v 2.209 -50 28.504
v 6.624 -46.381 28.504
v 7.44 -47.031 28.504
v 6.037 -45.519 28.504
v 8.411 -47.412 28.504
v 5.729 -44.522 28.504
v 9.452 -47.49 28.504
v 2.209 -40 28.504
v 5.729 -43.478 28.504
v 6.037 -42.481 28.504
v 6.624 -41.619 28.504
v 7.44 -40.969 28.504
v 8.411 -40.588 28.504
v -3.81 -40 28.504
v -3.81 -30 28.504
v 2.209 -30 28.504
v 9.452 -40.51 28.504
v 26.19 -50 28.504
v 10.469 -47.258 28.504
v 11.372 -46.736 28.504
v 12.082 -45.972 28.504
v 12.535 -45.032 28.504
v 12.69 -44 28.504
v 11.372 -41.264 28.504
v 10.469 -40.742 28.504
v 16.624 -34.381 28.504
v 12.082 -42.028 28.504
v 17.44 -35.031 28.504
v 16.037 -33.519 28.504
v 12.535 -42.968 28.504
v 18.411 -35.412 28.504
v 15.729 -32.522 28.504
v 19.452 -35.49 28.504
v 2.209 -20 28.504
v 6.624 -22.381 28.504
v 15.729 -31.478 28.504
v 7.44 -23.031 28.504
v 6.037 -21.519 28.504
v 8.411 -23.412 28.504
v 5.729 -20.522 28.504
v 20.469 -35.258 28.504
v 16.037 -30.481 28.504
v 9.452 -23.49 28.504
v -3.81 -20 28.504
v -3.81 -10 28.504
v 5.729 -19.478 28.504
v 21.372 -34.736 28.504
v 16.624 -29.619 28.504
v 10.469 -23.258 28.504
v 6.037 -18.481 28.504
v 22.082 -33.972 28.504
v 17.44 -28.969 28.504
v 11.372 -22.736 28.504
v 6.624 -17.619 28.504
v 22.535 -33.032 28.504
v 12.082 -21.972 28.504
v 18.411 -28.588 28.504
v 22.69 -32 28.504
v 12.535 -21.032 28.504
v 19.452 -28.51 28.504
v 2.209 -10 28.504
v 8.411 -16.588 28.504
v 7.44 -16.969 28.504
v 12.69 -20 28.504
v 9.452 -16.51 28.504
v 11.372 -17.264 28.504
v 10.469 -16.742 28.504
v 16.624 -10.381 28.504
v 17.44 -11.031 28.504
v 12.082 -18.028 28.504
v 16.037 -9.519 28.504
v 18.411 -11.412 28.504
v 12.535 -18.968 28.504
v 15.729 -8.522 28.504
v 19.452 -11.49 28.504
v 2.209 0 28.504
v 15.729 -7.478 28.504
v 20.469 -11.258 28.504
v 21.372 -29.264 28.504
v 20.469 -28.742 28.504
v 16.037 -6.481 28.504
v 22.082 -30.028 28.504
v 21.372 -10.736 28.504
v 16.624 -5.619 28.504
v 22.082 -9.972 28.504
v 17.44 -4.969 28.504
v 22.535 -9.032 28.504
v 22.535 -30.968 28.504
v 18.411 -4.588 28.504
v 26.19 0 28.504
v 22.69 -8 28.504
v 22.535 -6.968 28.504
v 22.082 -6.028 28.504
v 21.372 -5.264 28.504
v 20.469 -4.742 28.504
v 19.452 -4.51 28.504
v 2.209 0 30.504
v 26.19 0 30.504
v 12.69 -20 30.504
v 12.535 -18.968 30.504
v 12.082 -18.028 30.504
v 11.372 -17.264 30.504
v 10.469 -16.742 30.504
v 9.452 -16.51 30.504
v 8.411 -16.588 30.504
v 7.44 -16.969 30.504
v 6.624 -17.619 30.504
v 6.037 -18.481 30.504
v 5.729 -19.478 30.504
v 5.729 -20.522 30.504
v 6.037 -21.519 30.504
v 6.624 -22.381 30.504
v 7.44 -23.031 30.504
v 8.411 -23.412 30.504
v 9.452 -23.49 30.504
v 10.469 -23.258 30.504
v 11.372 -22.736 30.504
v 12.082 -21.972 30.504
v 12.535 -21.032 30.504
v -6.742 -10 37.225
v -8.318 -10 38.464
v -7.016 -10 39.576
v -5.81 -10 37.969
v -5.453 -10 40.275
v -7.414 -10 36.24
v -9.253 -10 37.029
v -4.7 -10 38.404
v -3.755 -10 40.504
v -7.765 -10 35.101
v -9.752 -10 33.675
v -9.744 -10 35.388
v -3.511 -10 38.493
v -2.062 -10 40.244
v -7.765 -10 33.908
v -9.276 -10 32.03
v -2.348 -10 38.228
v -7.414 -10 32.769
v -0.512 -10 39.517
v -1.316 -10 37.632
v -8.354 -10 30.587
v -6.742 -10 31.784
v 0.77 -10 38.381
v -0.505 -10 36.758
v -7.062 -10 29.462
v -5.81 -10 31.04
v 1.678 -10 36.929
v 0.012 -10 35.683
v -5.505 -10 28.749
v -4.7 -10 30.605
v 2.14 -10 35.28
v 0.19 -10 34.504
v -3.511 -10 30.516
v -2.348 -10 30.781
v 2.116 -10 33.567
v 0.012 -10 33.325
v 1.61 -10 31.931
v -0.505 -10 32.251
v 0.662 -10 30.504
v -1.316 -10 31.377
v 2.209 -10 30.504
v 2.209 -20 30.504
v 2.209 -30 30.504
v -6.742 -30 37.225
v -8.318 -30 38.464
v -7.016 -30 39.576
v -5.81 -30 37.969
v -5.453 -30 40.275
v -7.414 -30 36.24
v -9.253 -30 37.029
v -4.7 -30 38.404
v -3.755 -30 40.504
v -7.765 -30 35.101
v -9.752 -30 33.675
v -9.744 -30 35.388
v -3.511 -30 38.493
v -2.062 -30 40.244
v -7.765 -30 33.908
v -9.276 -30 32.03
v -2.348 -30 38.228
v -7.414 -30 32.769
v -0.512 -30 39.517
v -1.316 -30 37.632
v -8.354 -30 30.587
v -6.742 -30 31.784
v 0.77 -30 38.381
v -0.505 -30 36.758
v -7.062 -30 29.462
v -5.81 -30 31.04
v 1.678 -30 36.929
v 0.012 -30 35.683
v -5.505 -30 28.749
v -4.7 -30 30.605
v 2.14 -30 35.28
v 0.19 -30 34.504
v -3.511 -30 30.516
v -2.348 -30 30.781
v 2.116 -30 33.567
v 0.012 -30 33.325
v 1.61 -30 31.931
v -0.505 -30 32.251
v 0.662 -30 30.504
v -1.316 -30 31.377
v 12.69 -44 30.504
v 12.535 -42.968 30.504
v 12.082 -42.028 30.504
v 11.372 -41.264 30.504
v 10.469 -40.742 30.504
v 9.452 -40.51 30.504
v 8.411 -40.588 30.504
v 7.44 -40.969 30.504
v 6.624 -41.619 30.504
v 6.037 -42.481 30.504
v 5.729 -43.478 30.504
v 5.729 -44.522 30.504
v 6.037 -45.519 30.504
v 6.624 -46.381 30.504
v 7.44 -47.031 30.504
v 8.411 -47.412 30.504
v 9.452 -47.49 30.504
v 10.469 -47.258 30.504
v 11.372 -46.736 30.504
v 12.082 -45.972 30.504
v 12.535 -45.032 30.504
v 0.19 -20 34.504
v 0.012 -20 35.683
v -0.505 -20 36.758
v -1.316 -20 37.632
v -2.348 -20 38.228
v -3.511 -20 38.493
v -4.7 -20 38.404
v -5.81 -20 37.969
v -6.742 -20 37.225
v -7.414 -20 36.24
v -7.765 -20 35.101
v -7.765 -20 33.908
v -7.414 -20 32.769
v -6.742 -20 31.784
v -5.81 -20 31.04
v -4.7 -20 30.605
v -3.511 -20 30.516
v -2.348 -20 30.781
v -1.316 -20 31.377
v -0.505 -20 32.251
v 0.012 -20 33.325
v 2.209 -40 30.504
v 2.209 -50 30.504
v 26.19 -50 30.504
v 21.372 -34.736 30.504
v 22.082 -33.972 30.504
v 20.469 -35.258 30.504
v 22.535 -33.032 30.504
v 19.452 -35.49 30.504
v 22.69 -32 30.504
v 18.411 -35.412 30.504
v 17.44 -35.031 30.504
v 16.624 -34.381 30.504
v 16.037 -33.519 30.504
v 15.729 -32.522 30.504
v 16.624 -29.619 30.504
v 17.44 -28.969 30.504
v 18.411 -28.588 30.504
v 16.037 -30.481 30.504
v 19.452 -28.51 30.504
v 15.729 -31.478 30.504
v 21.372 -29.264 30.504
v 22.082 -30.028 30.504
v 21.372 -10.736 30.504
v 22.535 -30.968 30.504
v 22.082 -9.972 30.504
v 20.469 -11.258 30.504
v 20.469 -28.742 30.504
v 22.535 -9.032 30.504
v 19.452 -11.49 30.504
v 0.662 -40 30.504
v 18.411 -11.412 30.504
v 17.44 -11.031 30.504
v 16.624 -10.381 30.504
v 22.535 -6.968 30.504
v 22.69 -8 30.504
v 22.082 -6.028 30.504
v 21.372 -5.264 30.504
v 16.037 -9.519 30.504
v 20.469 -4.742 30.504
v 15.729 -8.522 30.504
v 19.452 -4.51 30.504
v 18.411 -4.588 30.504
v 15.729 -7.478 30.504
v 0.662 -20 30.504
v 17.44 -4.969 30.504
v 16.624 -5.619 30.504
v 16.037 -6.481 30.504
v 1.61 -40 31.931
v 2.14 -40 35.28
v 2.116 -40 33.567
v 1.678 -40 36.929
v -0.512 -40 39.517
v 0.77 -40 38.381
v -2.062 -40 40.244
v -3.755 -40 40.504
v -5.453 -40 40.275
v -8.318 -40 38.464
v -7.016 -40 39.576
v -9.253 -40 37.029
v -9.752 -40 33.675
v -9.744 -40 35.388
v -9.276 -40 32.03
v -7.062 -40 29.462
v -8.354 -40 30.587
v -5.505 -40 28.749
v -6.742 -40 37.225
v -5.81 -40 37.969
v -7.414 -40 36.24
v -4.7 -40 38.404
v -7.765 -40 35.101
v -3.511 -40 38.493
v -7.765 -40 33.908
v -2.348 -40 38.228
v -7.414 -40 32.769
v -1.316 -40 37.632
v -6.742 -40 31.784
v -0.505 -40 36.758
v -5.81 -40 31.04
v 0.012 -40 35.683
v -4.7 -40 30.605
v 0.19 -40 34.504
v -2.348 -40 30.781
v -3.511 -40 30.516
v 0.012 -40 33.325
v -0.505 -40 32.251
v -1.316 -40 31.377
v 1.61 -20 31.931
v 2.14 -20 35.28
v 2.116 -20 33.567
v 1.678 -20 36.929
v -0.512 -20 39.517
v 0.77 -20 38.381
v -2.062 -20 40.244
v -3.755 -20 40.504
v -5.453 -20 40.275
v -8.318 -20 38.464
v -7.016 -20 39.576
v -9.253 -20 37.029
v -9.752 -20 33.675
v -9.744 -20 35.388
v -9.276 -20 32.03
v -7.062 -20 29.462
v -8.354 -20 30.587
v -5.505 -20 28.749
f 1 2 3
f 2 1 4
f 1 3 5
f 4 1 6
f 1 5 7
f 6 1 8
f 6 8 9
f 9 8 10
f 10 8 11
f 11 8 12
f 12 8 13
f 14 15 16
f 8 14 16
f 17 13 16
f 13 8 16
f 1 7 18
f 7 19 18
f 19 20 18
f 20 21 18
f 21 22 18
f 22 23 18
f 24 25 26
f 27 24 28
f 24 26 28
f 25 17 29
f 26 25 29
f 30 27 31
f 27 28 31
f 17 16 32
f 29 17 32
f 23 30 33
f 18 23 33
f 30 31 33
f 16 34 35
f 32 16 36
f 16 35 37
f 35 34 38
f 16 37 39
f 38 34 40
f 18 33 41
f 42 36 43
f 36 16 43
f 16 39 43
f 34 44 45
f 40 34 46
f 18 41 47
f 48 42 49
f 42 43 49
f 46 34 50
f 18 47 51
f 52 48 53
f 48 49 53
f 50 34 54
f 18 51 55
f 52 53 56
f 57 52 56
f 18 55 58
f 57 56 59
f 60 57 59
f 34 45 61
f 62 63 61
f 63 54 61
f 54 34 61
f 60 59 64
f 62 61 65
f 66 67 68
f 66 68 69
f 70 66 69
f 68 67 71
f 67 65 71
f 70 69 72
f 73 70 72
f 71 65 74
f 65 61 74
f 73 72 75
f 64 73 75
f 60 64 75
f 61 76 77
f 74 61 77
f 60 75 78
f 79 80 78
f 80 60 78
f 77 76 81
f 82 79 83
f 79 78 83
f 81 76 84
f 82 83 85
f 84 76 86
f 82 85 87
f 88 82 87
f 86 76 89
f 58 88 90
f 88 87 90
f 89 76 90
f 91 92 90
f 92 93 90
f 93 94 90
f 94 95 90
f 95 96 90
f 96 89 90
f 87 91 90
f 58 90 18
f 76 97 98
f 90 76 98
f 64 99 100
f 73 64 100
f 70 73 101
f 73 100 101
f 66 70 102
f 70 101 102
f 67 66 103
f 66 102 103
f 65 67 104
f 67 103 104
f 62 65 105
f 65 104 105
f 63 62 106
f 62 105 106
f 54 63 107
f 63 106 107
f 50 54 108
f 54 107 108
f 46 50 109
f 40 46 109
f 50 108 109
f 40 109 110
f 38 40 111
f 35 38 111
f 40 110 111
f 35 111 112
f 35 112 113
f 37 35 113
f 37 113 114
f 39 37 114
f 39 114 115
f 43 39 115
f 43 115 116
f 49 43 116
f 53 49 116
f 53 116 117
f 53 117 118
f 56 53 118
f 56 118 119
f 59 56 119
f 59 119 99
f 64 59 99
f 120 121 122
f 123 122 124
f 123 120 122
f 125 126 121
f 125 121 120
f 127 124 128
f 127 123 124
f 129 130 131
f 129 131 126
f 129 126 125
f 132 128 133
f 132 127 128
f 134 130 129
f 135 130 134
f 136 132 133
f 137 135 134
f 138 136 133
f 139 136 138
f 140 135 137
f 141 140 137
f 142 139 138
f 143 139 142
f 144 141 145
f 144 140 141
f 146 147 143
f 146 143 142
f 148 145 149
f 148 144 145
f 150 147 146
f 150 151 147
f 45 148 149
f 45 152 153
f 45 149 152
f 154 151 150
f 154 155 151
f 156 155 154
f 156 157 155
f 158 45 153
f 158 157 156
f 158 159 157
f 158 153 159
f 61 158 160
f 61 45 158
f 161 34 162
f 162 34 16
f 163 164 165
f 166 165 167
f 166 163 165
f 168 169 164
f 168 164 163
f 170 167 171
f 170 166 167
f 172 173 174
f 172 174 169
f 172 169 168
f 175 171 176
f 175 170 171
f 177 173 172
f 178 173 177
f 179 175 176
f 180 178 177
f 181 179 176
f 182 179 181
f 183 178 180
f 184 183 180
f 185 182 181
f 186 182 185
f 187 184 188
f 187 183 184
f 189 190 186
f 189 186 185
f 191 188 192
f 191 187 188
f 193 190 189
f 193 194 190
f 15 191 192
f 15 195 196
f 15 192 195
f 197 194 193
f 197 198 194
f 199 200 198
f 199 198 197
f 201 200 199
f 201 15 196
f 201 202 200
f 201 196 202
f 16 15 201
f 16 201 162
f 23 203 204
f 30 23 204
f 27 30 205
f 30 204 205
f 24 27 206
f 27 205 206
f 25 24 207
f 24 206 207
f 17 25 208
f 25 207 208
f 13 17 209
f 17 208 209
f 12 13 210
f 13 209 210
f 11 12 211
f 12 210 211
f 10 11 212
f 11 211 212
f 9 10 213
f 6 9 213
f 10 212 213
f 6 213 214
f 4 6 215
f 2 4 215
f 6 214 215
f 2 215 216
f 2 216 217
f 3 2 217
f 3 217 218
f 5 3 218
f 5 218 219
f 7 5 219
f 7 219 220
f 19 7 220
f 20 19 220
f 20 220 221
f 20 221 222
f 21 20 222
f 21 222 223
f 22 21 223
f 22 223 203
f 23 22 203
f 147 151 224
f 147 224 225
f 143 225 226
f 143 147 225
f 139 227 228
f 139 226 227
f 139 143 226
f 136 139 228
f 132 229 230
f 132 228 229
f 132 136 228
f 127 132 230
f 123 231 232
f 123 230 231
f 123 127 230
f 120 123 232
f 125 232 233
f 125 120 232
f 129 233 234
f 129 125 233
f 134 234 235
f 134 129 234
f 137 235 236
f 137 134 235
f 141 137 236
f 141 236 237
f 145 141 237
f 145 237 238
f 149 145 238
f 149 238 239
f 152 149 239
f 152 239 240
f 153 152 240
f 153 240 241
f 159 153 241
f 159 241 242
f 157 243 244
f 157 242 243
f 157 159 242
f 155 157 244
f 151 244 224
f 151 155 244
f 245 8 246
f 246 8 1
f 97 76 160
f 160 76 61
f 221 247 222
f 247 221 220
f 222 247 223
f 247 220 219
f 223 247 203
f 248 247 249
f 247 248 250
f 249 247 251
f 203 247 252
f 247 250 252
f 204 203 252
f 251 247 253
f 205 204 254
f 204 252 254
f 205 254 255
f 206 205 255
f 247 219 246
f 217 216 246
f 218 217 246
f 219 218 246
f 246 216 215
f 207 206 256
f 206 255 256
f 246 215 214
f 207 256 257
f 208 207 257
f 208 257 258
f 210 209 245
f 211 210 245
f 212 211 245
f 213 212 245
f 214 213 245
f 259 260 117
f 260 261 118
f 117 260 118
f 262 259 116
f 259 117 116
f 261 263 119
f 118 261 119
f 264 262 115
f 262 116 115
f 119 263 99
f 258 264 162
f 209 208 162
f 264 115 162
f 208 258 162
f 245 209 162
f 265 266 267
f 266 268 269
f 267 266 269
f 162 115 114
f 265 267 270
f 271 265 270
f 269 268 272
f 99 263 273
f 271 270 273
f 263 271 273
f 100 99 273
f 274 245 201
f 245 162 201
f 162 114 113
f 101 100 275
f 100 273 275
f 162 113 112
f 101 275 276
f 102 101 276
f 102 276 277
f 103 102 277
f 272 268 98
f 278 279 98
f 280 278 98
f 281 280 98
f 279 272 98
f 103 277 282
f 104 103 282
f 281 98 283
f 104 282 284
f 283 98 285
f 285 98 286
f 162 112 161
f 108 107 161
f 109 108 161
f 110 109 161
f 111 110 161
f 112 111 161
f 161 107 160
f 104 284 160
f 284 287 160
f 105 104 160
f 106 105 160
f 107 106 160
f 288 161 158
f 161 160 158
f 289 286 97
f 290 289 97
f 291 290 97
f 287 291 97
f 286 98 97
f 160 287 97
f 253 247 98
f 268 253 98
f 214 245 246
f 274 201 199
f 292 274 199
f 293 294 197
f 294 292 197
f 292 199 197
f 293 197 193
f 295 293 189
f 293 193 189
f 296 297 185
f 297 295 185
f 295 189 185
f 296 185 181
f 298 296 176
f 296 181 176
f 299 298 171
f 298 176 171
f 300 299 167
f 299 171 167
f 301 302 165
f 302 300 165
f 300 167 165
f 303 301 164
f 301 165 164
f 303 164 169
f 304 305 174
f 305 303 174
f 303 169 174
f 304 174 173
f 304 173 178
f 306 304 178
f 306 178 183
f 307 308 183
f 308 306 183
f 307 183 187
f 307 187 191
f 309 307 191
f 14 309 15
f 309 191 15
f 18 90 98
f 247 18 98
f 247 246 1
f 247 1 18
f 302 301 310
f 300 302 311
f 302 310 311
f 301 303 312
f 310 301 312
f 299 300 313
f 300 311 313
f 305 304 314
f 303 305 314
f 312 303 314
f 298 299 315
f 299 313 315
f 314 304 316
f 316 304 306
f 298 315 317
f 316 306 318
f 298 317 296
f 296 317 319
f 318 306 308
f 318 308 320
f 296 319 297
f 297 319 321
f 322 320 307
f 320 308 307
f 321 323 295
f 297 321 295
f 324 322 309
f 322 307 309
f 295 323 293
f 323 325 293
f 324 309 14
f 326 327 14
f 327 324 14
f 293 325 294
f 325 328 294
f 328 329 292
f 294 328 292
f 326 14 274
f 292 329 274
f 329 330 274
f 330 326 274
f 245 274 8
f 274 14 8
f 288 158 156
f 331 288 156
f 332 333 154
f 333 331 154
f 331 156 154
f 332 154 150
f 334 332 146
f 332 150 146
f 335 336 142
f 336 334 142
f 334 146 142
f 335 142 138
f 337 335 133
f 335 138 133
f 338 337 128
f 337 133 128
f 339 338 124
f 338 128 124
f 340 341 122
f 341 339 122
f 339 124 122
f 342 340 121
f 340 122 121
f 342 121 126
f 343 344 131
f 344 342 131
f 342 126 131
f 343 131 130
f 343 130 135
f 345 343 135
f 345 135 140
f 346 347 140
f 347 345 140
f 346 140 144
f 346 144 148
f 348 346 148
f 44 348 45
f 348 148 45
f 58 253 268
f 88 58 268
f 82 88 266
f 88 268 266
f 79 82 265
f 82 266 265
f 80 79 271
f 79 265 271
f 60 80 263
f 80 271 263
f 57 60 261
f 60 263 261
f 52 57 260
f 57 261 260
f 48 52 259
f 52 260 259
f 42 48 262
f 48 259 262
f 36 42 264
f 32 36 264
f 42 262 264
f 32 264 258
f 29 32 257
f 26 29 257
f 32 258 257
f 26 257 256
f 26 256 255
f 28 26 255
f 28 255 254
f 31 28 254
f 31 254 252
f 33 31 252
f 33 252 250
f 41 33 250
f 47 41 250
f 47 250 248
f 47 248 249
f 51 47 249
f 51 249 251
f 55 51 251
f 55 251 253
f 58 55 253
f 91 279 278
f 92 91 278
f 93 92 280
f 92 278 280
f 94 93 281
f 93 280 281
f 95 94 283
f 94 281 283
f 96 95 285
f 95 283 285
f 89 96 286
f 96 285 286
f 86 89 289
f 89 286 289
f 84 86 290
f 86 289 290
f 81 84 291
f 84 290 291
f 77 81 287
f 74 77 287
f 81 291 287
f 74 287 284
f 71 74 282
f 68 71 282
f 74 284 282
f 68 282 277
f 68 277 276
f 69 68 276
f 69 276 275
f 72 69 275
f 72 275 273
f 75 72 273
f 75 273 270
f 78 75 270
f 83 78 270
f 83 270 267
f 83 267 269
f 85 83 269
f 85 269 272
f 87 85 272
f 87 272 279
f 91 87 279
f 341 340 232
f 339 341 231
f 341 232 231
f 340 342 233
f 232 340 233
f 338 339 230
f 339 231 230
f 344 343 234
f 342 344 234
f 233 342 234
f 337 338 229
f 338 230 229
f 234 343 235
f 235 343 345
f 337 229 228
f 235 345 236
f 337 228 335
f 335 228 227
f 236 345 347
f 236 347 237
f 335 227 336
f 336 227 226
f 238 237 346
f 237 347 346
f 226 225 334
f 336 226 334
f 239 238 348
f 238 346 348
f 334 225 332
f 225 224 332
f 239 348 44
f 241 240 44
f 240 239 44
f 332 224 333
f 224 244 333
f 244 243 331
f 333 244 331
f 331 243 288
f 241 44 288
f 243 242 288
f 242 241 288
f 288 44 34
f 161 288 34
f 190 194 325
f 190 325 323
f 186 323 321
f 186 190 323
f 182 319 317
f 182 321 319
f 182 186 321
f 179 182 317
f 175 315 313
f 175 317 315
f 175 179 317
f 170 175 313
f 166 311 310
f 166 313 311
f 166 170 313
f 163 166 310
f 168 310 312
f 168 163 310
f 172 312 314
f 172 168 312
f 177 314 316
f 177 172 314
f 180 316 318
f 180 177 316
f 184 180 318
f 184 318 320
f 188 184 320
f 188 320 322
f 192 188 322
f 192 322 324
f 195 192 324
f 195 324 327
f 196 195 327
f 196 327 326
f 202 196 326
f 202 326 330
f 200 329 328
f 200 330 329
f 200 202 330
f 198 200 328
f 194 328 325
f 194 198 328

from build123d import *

# Parameters (mm, degrees)
F0_R     = 4
F1_DEPTH = 50
F2_R     = 3.5
F3_DEPTH = 2.001
F4_W     = 14.260426
F4_H     = 10
F4_W_2   = 14.935048
F4_W_3   = 15.686511
F5_DEPTH = 25


with BuildPart() as f1:
    # F0 (on Front) → F1 (new body)
    with BuildSketch(Plane.XZ):
        with BuildLine():
            Line((26.190159, 30.504479), (0.662295, 30.504479))
            ThreePointArc((0.662295, 30.504479), (-6.259331, 39.981705), (-3.809841, 28.504479))
            Line((-3.809841, 28.504479), (26.190159, 28.504479))
            Line((26.190159, 28.504479), (26.190159, 30.504479))
        make_face()
        with Locations((-3.809841, 34.504479)):
            Circle(F0_R, mode=Mode.SUBTRACT)
    extrude(amount=F1_DEPTH)

    # F2 (on face) → F3 (cut, through all)
    with BuildSketch(Plane.XY.offset(30.504479)):
        with Locations((19.190159, -32)):
            Circle(F2_R)
        with Locations((9.190159, -44)):
            Circle(F2_R)
        with Locations((9.190159, -20)):
            Circle(F2_R)
        with Locations((19.190159, -8)):
            Circle(F2_R)
    extrude(amount=-F3_DEPTH, mode=Mode.SUBTRACT)

    # F4 (on face) → F5 (cut)
    with BuildSketch(Plane(origin=(0, 0, 28.504479), x_dir=(1, 0, 0), z_dir=(0, 0, -1))):
        with Locations((-4.92115, 45)):
            Rectangle(F4_W, F4_H)
        with Locations((-5.258461, 25)):
            Rectangle(F4_W_2, F4_H)
        with Locations((-5.634192, 5)):
            Rectangle(F4_W_3, F4_H)
    extrude(amount=-F5_DEPTH, mode=Mode.SUBTRACT)


solid = f1.part
